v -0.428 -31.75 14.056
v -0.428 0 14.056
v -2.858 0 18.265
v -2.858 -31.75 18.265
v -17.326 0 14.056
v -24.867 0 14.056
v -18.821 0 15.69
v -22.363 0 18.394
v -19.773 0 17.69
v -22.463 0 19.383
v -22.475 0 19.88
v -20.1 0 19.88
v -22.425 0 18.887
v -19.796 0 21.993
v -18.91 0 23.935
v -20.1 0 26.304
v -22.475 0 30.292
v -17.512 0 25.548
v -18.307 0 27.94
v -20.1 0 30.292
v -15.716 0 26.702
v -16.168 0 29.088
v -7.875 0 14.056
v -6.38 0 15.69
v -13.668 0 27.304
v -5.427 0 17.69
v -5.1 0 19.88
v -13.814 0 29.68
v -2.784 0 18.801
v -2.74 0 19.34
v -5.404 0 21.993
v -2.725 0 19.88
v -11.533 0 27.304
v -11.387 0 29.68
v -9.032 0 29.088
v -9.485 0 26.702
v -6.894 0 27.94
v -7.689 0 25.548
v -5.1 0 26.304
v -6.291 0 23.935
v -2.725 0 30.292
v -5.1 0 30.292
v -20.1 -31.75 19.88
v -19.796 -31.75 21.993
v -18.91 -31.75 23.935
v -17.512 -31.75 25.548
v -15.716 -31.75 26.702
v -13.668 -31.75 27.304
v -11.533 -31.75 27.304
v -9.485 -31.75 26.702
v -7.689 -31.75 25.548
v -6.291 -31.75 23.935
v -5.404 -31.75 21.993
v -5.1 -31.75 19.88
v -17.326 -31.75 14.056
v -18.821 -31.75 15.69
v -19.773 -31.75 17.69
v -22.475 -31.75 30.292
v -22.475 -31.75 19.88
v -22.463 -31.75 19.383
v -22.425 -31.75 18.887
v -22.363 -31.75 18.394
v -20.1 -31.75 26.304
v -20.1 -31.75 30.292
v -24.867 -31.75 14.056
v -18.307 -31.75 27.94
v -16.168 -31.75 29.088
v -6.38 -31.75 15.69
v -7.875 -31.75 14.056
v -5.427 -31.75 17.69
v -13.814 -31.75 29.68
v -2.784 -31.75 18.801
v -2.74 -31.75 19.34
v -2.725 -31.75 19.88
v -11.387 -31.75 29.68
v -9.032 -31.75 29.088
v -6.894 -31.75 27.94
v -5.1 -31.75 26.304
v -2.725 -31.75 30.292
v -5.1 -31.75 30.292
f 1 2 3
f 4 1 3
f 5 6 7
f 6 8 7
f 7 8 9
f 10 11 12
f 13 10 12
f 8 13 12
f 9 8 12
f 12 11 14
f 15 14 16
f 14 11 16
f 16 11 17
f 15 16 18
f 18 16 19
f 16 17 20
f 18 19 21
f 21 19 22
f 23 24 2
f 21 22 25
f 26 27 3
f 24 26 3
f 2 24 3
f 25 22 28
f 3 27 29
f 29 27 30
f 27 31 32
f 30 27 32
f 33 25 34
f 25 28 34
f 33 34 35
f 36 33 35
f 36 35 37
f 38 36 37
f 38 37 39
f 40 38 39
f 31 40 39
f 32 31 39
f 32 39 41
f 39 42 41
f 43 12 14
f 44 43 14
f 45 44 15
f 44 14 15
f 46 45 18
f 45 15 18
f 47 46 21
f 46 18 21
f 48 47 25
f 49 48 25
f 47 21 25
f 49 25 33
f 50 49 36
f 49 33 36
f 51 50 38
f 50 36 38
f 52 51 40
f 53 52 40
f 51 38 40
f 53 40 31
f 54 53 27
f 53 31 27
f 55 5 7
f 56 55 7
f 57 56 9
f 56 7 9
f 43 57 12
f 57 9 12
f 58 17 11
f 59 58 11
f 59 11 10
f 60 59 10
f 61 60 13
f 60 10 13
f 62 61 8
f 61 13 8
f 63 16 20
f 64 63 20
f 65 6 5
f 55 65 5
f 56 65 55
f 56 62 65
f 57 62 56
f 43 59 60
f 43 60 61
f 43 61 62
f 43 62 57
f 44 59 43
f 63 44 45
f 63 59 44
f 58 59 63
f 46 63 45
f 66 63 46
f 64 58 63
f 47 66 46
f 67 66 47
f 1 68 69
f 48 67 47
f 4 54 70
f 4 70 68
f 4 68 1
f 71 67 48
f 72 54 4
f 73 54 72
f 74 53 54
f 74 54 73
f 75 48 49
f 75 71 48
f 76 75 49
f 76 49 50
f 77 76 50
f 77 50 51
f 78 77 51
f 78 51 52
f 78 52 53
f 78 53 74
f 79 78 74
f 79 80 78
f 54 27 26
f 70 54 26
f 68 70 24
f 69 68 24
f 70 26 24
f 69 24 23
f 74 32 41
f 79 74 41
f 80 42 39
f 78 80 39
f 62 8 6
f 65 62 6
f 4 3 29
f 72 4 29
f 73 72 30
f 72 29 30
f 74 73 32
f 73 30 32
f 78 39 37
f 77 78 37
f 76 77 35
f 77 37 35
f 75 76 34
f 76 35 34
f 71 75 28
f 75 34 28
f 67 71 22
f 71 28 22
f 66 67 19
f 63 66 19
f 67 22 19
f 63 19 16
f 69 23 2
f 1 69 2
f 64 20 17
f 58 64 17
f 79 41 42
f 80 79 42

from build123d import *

# Parameters (mm, degrees)
F1_DEPTH = 31.75


with BuildPart() as f1:
    # F0 (on Front) → F1 (new body)
    with BuildSketch(Plane.XZ):
        with BuildLine():
            Line((-24.867260192, 14.0561722352), (-20.5749857529, 14.0561722352))
            ThreePointArc((-20.5749857529, 14.0561722352), (-21.7302586773, 16.117381452), (-22.3627959644, 18.394031523))
            Line((-22.3627959644, 18.394031523), (-24.867260192, 14.0561722352))
        make_face()
        with BuildLine():
            ThreePointArc((-17.3257802935, 14.0561722352), (-19.3712146858, 16.6546470319), (-20.1002728939, 19.8802240735))
            Line((-20.1002728939, 19.8802240735), (-20.1002728939, 22.3128364345))
            Line((-20.1002728939, 22.3128364345), (-22.3627959644, 18.394031523))
            ThreePointArc((-22.3627959644, 18.394031523), (-21.7302586773, 16.117381452), (-20.5749857529, 14.0561722352))
            Line((-20.5749857529, 14.0561722352), (-17.3257802935, 14.0561722352))
        make_face()
        with BuildLine():
            Line((-22.3627959644, 18.394031523), (-20.1002728939, 22.3128364345))
            Line((-20.1002728939, 22.3128364345), (-20.1002728939, 26.3040566523))
            ThreePointArc((-20.1002728939, 26.3040566523), (-21.8625114192, 23.3046309565), (-22.4752728939, 19.8802240735))
            ThreePointArc((-22.4752728939, 19.8802240735), (-22.4471135121, 19.1350027378), (-22.3627959644, 18.394031523))
        make_face()
        with BuildLine():
            ThreePointArc((-22.4752728939, 19.8802240735), (-21.8625114192, 23.3046309565), (-20.1002728939, 26.3040566523))
            Line((-20.1002728939, 26.3040566523), (-20.1002728939, 30.2920383944))
            Line((-20.1002728939, 30.2920383944), (-22.4752728939, 30.2920383944))
            Line((-22.4752728939, 30.2920383944), (-22.4752728939, 19.8802240735))
        make_face()
        with BuildLine():
            ThreePointArc((-20.1002728939, 19.8802240735), (-12.6002728939, 27.3802240735), (-5.1002728939, 19.8802240735))
            Line((-5.1002728939, 19.8802240735), (-5.1002728939, 22.1484367352))
            Line((-5.1002728939, 22.1484367352), (-5.1002728939, 26.3040566523))
            ThreePointArc((-5.1002728939, 26.3040566523), (-12.6002728939, 29.7552240735), (-20.1002728939, 26.3040566523))
            Line((-20.1002728939, 26.3040566523), (-20.1002728939, 22.3128364345))
            Line((-20.1002728939, 22.3128364345), (-20.1002728939, 19.8802240735))
        make_face()
        with BuildLine():
            Line((-5.1002728939, 22.1484367352), (-5.1002728939, 19.8802240735))
            ThreePointArc((-5.1002728939, 19.8802240735), (-5.8293311021, 16.6546470319), (-7.8747654943, 14.0561722352))
            Line((-7.8747654943, 14.0561722352), (-4.6255600349, 14.0561722352))
            ThreePointArc((-4.6255600349, 14.0561722352), (-3.4953535559, 16.057127312), (-2.8582453868, 18.265131181))
            Line((-2.8582453868, 18.265131181), (-5.1002728939, 22.1484367352))
        make_face()
        with BuildLine():
            Line((-5.1002728939, 26.3040566523), (-5.1002728939, 22.1484367352))
            Line((-5.1002728939, 22.1484367352), (-2.8582453868, 18.265131181))
            ThreePointArc((-2.8582453868, 18.265131181), (-2.758572161, 19.0699453043), (-2.7252728939, 19.8802240735))
            ThreePointArc((-2.7252728939, 19.8802240735), (-3.3380343686, 23.3046309565), (-5.1002728939, 26.3040566523))
        make_face()
        with BuildLine():
            ThreePointArc((-2.8582453868, 18.265131181), (-3.4953535559, 16.057127312), (-4.6255600349, 14.0561722352))
            Line((-4.6255600349, 14.0561722352), (-0.4282018064, 14.0561722352))
            Line((-0.4282018064, 14.0561722352), (-2.8582453868, 18.265131181))
        make_face()
        with BuildLine():
            Line((-5.1002728939, 30.2920383944), (-5.1002728939, 26.3040566523))
            ThreePointArc((-5.1002728939, 26.3040566523), (-3.3380343686, 23.3046309565), (-2.7252728939, 19.8802240735))
            Line((-2.7252728939, 19.8802240735), (-2.7252728939, 30.2920383944))
            Line((-2.7252728939, 30.2920383944), (-5.1002728939, 30.2920383944))
        make_face()
    extrude(amount=F1_DEPTH)


solid = f1.part
